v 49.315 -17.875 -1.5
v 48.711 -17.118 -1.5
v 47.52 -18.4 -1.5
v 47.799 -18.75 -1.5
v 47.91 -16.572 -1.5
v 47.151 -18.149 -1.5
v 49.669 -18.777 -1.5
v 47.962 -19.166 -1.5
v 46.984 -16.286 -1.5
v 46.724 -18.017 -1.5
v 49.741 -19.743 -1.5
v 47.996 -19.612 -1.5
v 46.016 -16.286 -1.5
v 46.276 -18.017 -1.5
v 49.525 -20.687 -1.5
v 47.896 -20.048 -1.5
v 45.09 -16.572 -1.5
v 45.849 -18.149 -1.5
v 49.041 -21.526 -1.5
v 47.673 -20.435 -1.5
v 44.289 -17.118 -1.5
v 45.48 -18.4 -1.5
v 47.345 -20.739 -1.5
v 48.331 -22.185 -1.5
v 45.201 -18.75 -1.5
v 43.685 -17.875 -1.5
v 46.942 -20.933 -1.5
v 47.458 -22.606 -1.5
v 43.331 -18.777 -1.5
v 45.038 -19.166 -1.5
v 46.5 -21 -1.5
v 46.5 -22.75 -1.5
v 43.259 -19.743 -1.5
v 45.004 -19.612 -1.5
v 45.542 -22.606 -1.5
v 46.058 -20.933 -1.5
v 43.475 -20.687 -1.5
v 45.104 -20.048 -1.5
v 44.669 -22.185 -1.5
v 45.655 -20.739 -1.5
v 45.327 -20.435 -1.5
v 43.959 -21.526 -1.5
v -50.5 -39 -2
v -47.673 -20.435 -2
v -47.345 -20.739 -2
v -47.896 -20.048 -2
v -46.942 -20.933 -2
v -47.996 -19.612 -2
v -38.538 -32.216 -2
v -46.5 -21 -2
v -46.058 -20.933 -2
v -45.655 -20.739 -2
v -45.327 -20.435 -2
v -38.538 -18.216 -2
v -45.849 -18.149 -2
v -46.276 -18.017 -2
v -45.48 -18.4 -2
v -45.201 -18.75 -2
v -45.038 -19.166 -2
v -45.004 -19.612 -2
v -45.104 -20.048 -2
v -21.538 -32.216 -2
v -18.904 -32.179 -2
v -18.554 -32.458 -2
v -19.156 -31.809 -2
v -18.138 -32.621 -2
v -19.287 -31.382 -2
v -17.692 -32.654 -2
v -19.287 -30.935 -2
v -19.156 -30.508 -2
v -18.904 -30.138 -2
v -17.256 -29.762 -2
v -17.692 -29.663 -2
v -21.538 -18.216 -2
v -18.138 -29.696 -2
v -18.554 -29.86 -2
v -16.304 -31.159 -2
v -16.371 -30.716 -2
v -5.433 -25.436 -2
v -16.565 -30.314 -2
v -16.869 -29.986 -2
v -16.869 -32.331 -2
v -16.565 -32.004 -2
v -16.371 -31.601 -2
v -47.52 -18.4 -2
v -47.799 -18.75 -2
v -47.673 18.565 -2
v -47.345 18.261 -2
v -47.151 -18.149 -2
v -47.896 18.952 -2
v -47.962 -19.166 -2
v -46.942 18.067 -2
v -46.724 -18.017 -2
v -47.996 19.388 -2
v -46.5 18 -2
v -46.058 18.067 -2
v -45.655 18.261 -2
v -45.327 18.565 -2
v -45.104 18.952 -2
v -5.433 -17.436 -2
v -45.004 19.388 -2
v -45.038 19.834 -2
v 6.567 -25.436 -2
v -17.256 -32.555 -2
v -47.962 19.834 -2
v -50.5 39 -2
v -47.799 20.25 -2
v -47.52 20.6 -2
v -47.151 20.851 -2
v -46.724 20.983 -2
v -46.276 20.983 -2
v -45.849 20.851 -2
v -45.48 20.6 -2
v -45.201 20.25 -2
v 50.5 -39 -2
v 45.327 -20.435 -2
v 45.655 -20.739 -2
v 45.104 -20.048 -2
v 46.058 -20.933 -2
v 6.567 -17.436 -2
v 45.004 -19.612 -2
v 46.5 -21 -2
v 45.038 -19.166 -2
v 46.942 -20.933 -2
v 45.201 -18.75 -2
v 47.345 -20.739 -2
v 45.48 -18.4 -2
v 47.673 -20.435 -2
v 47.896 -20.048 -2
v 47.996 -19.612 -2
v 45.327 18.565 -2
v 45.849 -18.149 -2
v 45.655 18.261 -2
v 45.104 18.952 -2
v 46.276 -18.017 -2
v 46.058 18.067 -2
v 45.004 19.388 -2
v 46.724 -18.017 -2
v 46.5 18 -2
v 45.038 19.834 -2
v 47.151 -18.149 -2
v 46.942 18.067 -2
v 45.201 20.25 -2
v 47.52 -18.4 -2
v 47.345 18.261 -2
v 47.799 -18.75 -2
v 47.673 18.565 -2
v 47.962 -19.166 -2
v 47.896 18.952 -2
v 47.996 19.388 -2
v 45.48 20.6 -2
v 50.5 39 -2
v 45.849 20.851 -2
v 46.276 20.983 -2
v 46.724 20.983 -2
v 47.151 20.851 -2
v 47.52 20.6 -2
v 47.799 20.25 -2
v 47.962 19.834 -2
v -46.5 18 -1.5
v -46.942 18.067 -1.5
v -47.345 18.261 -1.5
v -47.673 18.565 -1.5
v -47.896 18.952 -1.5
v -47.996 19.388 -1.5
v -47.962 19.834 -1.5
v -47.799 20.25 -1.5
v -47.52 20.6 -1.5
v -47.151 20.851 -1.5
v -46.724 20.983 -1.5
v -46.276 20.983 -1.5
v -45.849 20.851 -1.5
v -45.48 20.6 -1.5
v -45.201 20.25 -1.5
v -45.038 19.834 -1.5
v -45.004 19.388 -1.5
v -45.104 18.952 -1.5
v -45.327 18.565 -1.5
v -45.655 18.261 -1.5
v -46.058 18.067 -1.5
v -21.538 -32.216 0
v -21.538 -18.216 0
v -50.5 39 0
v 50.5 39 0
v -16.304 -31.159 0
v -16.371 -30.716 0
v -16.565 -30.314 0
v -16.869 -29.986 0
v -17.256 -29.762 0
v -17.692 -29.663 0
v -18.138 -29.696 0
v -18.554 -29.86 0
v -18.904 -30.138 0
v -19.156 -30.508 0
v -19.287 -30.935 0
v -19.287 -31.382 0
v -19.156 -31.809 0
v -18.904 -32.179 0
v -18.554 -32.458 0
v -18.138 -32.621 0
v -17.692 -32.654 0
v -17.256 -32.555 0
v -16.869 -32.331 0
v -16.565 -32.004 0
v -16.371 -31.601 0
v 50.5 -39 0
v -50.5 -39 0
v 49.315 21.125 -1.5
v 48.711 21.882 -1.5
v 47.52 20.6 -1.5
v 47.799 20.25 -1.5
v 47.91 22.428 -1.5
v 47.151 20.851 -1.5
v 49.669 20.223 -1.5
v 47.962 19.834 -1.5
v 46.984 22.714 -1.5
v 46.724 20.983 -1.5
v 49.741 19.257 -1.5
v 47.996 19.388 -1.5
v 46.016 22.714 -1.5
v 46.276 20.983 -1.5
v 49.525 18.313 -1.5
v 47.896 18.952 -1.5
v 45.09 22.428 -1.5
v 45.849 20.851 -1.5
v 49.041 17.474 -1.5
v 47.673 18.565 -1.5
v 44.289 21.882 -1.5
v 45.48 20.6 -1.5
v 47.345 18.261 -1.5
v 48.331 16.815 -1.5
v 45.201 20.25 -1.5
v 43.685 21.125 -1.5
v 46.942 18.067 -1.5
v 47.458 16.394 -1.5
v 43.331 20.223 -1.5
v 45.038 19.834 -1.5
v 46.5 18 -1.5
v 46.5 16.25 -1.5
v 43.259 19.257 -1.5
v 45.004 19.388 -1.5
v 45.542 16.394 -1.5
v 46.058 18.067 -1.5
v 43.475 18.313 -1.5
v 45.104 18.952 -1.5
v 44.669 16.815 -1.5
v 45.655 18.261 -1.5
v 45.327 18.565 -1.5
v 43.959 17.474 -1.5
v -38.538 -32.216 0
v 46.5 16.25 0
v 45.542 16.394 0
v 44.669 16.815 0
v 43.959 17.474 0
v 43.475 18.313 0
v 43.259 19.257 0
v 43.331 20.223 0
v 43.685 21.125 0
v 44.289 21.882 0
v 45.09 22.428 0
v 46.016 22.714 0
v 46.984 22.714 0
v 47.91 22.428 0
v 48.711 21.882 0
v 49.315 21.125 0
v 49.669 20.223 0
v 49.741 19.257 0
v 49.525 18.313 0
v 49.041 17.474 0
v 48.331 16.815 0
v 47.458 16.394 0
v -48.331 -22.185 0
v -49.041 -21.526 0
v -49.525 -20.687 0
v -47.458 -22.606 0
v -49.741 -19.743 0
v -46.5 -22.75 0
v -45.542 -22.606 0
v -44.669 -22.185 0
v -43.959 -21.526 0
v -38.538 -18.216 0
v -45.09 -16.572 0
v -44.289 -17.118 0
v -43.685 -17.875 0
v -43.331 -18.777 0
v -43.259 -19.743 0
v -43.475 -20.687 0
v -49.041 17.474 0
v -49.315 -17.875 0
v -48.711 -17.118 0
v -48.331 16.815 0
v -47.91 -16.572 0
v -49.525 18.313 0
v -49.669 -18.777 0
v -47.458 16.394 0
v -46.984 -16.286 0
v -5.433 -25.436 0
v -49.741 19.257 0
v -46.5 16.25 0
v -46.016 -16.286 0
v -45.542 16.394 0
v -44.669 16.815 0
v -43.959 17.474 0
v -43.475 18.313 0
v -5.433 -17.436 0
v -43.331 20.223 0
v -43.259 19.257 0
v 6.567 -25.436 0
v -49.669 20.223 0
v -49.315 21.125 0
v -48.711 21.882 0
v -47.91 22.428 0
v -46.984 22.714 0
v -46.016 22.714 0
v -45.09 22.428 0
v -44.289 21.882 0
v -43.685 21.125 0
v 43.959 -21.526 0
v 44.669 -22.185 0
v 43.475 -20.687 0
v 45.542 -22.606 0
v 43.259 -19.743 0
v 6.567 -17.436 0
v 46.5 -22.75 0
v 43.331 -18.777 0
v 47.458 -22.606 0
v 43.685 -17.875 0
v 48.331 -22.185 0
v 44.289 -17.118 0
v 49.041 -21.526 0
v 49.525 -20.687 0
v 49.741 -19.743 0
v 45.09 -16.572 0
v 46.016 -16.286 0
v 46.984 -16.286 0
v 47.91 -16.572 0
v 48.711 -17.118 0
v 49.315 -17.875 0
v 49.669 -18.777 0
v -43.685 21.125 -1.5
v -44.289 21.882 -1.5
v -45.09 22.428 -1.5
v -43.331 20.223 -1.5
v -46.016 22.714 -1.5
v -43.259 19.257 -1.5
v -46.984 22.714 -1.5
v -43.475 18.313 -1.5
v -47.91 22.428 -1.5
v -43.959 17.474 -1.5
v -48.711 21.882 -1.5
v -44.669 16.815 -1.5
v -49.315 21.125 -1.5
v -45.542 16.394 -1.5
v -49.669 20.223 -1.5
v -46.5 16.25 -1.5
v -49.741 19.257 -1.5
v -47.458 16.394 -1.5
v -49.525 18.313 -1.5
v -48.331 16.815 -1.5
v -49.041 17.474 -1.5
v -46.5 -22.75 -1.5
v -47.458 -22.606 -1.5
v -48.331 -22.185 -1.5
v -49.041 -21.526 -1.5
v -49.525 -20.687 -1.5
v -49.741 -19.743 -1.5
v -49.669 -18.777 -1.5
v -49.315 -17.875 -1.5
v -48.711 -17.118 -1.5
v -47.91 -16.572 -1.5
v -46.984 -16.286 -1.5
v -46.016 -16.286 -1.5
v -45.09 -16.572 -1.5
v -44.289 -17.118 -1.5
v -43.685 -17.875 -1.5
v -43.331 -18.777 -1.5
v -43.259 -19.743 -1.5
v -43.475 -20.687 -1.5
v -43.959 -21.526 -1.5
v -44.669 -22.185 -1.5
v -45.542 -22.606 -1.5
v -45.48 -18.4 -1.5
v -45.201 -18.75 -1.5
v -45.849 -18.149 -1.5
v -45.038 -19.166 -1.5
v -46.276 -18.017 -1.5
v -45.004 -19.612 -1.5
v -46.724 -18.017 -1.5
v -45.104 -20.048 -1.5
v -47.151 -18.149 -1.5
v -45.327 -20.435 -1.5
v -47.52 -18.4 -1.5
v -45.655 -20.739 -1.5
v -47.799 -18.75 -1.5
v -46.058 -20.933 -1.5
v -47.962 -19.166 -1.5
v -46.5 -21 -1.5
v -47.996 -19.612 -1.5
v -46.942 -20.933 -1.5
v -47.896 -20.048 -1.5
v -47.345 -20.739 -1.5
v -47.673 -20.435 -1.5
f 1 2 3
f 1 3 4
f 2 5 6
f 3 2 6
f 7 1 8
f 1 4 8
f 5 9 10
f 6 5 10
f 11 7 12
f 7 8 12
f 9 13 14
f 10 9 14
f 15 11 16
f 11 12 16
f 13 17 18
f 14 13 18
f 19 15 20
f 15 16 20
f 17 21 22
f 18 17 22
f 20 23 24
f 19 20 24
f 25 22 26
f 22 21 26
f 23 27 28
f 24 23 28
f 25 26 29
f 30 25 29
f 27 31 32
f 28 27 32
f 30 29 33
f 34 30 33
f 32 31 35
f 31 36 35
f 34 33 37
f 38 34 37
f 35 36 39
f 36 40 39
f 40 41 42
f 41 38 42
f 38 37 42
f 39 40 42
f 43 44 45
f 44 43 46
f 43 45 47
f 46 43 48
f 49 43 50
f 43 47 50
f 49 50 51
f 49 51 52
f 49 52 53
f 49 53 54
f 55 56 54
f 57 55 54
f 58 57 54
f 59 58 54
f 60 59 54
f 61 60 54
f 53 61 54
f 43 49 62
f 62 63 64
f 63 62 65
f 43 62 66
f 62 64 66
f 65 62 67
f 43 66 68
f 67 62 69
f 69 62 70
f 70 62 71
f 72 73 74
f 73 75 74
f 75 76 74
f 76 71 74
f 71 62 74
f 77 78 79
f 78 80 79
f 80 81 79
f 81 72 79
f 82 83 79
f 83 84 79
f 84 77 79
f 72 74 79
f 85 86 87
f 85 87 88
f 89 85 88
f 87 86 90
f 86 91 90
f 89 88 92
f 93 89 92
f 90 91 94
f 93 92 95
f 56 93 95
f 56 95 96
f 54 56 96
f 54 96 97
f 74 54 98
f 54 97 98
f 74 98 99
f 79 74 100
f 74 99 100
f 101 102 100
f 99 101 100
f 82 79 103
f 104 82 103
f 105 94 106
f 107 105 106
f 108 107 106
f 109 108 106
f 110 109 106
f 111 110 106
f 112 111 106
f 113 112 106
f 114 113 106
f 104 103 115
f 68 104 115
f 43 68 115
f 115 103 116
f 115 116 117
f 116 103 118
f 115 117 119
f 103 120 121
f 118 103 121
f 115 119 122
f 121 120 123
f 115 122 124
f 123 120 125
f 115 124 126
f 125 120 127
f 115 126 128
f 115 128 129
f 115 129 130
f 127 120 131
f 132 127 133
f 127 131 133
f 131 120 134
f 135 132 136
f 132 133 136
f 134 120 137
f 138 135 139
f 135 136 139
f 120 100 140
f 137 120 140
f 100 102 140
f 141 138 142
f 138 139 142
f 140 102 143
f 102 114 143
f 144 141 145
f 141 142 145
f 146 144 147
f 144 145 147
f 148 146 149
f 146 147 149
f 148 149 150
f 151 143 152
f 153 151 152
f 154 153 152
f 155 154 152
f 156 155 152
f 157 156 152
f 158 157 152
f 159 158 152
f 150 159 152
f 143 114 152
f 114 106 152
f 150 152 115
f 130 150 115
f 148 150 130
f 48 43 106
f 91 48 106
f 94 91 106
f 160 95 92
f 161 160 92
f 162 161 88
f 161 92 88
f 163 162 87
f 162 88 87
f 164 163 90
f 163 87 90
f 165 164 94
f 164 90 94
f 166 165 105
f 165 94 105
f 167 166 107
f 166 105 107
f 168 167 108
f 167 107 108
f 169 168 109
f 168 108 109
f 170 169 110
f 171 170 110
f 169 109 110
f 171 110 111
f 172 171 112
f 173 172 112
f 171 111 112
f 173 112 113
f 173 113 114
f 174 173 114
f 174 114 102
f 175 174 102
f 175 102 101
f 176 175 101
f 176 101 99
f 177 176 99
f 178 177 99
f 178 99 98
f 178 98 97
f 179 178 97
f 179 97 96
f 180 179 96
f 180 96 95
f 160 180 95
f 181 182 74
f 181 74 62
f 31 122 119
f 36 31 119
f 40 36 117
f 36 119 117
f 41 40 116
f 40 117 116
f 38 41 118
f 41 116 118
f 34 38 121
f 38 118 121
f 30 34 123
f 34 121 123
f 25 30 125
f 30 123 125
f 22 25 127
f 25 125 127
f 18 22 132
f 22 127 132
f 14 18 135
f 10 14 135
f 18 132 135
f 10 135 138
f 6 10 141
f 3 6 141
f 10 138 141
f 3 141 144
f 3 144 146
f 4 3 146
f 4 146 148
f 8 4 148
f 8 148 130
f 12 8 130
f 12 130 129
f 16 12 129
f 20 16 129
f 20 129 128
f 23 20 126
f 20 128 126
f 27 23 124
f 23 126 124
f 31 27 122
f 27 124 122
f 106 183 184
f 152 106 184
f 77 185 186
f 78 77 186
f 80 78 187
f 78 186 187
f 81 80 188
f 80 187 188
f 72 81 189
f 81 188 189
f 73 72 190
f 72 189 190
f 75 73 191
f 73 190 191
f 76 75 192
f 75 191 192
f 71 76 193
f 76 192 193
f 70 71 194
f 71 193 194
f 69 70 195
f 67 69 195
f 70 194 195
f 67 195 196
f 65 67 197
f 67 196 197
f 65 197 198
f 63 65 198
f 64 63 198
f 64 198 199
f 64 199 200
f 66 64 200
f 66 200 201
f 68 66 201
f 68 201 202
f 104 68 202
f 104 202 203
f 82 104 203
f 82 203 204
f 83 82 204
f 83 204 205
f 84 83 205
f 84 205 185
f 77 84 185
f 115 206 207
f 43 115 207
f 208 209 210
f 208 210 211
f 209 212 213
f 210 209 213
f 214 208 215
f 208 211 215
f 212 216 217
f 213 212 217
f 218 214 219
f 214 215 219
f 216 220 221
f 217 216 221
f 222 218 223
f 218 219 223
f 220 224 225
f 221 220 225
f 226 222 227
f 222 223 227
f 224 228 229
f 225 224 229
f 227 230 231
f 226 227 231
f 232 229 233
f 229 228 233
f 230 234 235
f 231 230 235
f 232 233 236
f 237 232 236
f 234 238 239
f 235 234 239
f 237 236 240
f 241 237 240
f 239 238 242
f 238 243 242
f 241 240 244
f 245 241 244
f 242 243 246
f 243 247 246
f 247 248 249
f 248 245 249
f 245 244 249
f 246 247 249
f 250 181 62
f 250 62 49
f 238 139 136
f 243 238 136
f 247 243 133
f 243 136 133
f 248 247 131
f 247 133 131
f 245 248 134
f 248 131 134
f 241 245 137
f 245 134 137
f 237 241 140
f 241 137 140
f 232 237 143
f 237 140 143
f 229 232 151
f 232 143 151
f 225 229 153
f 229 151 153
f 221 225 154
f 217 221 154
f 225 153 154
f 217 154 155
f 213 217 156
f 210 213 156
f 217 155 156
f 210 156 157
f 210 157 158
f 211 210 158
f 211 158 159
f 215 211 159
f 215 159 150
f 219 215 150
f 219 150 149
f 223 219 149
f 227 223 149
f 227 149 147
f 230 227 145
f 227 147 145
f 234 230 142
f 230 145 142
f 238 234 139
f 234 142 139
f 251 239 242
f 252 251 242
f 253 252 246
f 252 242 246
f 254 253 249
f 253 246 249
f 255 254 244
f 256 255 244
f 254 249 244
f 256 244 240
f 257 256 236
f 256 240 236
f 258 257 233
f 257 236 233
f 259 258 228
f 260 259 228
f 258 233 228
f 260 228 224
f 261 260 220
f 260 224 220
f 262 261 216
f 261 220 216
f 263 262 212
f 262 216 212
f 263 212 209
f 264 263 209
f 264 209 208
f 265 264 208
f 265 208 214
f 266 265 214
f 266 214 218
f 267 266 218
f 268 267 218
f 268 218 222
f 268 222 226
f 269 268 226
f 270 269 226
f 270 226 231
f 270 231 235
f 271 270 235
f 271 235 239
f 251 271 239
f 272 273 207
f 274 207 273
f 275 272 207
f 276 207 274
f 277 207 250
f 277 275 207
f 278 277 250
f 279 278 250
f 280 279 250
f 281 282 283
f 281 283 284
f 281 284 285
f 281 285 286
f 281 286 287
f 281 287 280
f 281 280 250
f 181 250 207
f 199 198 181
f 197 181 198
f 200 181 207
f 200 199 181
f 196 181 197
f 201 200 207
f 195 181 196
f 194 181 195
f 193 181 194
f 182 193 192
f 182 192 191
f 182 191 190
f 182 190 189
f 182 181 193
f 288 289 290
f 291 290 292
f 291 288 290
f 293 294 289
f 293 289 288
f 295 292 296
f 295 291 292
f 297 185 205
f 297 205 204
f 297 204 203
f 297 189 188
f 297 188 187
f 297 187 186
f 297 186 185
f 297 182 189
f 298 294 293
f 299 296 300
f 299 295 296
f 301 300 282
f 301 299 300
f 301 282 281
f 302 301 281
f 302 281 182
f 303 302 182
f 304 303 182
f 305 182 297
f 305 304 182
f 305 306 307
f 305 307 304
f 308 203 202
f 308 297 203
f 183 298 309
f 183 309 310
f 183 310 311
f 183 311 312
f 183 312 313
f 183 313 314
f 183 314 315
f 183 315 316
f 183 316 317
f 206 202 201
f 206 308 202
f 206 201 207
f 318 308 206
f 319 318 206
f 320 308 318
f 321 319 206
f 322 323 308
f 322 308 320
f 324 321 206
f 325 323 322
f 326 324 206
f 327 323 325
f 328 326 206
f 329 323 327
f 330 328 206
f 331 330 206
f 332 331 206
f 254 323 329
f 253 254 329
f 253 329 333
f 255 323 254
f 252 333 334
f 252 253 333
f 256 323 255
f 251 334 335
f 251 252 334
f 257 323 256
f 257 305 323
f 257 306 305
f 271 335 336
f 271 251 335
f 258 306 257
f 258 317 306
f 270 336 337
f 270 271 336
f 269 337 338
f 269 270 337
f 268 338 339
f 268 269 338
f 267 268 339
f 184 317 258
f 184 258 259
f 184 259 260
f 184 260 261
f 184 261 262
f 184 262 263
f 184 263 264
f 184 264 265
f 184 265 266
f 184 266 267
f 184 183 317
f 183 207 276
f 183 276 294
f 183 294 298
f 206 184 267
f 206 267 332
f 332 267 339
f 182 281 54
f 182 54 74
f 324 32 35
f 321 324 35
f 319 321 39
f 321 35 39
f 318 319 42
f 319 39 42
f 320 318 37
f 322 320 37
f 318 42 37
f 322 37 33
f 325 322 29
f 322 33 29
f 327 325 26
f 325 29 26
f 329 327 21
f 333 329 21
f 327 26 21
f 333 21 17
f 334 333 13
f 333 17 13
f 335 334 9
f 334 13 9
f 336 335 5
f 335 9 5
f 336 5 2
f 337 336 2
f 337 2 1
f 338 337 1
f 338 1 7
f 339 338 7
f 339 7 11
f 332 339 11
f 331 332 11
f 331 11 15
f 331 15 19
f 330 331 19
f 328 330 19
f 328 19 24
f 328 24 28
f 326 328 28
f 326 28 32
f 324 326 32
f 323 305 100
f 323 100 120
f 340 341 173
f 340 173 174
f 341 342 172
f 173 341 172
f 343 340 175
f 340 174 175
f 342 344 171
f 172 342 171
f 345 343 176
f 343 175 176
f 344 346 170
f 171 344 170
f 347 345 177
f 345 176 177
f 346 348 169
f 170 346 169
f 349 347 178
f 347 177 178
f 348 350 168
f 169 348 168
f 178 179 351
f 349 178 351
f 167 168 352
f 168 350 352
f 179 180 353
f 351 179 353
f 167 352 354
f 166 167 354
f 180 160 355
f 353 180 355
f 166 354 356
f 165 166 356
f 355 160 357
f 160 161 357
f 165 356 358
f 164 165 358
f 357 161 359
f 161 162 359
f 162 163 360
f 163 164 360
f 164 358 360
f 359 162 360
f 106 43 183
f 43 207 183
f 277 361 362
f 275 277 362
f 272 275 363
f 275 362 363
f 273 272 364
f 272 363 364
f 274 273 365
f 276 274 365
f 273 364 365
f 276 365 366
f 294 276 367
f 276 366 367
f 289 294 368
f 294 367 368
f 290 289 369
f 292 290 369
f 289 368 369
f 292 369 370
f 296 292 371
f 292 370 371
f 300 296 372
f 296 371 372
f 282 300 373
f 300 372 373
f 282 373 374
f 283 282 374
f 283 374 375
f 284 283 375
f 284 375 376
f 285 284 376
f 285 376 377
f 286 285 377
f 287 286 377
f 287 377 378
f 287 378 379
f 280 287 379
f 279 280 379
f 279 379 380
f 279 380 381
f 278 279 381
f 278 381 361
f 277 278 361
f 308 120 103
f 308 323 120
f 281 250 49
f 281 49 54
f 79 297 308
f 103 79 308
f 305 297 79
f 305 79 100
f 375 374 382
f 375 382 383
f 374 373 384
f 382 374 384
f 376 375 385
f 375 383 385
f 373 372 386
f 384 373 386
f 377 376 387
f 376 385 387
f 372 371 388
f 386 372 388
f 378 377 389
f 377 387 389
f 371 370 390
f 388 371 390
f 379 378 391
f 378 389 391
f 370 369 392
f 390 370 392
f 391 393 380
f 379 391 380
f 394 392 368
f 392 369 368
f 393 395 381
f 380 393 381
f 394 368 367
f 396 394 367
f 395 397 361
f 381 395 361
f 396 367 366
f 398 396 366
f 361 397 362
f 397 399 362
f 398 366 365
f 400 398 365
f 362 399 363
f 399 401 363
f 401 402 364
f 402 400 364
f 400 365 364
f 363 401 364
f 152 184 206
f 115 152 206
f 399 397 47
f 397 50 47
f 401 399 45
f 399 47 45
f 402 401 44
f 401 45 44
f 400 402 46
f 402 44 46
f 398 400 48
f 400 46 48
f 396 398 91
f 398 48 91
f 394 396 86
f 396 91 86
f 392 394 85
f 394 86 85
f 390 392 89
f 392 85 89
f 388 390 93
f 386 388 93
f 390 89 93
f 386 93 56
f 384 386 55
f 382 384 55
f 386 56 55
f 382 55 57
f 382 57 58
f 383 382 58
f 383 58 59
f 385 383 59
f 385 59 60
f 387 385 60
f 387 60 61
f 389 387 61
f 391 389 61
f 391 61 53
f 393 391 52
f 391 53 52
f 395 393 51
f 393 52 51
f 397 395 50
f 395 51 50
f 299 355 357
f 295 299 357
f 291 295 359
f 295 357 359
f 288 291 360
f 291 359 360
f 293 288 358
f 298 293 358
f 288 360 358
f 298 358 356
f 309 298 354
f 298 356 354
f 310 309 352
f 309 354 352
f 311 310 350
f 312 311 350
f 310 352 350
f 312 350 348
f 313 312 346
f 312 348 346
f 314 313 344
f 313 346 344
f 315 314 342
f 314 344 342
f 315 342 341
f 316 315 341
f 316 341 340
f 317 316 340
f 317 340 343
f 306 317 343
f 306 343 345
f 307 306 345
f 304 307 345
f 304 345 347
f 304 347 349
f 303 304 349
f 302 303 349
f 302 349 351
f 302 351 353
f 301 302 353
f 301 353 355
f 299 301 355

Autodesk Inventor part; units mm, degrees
ref_plane "YZ Plane" through (0, 0, 0) normal (1, 0, 0) x (0, 1, 0)
ref_plane "XZ Plane" through (0, 0, 0) normal (0, 1, 0) x (-1, 0, 0)
ref_plane "XY Plane" through (0, 0, 0) normal (0, 0, 1) x (1, 0, 0)
sketch "Esboço1" plane through (0, 0, 0) normal (0, 0, 1) x (1, 0, 0)
  line L0 (-50.5, 39) -> (50.5, 39)
  line L1 (50.5, 39) -> (50.5, -39)
  line L2 (50.5, -39) -> (-50.5, -39)
  line L3 (-50.5, -39) -> (-50.5, 39)
  point P0 (0, 0)
  dimension "d2" = 101
  dimension "d3" = 78
  dimension "d4" = 101
  dimension "d5" = 50.5
  dimension "d6" = 39
extrude "Extrusão1" add sketch "Esboço1" against normal blind 2
sketch "Esboço2" plane through (0, 0, 0) normal (0, 0, 1) x (1, 0, 0)
  line L0 (50.5, -39) -> (-50.5, -39) projected
  line L1 (42.5, 39) -> (42.5, -39) construction
  line L2 (-50.5, -39) -> (-50.5, 39) projected
  line L3 (50.5, 39) -> (50.5, -39) projected
  line L4 (-42.5, 39) -> (-42.5, -39) construction
  line L5 (-50.5, 39) -> (50.5, 39) projected
  line L6 (-50.5, 19.5) -> (50.5, 19.5) construction
  line L7 (-50.5, -19.5) -> (50.5, -19.5) construction
  line L8 (-50.5, 39) -> (50.5, 39) projected
  line L9 (-46.5, 39) -> (-46.5, -39) construction
  line L10 (50.5, -39) -> (-50.5, -39) projected
  line L11 (46.5, 39) -> (46.5, -39) construction
  point P0 (0, 0)
  point P1 (-46.5, 19.5)
  point P2 (-46.5, -19.5)
  point P3 (46.5, -19.5)
  point P4 (46.5, 19.5)
  dimension "d32" = 8
  dimension "d33" = 8
  dimension "d34" = 4
  dimension "d35" = 4
  dimension "d36" = 19.5
  dimension "d37" = 58.5
  dimension "d38" = 78
  dimension "d39" = 78
hole "Furo2" at (-46.5, 19.5, 0) at (-46.5, -19.5, 0) at (46.5, -19.5, 0) at (46.5, 19.5, 0) direction (0, 0, -1) diameter 3 end through all counterbore diameter 6.5 counterbore depth 1.5
sketch "Esboço3" plane through (0, 0, 0) normal (0, 0, 1) x (1, 0, 0)
  line L0 (-22.0376, -18.7161) -> (-38.0376, -18.7161) projected
  line L1 (-38.0376, -18.7161) -> (-38.0376, -31.7161) projected
  line L2 (-22.0376, -31.7161) -> (-22.0376, -18.7161) projected
  line L3 (-38.0376, -31.7161) -> (-22.0376, -31.7161) projected
  line L4 (-39.6791, -31.6586) -> (39.7959, -31.6586) projected
  line L5 (-18.3542, -30.6586) -> (-17.2542, -30.6586) projected
  line L6 (-18.8542, -30.6586) -> (-18.3542, -30.6586) projected
  line L7 (-17.2542, -30.6586) -> (-16.7542, -30.6586) projected
  line L8 (-16.5542, -30.6586) -> (-16.7542, -30.6586) projected
  line L9 (-16.5542, -30.6586) -> (-16.5542, -30.6586) projected
  line L10 (-16.5542, -31.6586) -> (-16.5542, -30.6586) projected
  line L11 (-16.6542, -31.6586) -> (-16.5542, -31.6586) projected
  line L12 (-16.6542, -31.6586) -> (-17.0042, -31.6586) projected
  line L13 (-17.1042, -31.6586) -> (-17.0042, -31.6586) projected
  line L14 (-17.1042, -31.6586) -> (-17.6542, -31.6586) projected
  line L15 (-17.9542, -31.6586) -> (-17.6542, -31.6586) projected
  line L16 (-17.9542, -31.6586) -> (-18.9542, -31.6586) projected
  line L17 (-19.0542, -31.6586) -> (-18.7042, -31.6586) projected
  line L18 (-19.0542, -30.6586) -> (-19.0542, -31.6586) projected
  line L19 (-9.5679, -25.4931) -> (-14.5971, -25.4931) projected
  line L20 (12.8419, -28.4101) -> (10.7613, -25.4356)
  line L21 (10.7613, -31.6586) -> (10.7613, -25.4356) projected
  line L22 (12.8419, -29.4261) -> (12.8419, -28.4101) projected
  line L23 (-14.5971, -31.7161) -> (-14.5971, -25.4931) projected
  line L24 (-9.5679, -31.7161) -> (-9.5679, -25.4931) projected
  line L25 (-21.5376, -32.2161) -> (-38.5376, -32.2161)
  line L26 (-38.5376, -32.2161) -> (-38.5376, -18.2161)
  line L27 (-38.5376, -18.2161) -> (-21.5376, -18.2161)
  line L28 (-21.5376, -18.2161) -> (-21.5376, -32.2161)
  circle A0 centre (-17.8042, -31.1586) radius 1.5
  line L29 (-9.5679, -25.4356) -> (10.7613, -25.4356) construction
  line L30 (-5.4326, -25.4356) -> (6.5674, -25.4356)
  line L31 (-5.4326, -25.4356) -> (-5.4326, -17.4356)
  line L32 (-5.4326, -17.4356) -> (6.5674, -17.4356)
  line L33 (6.5674, -17.4356) -> (6.5674, -25.4356)
  line L34 (10.7029, -25.4356) -> (15.7321, -25.4356) projected
  line L35 (15.7321, -31.6586) -> (15.7321, -25.4356) projected
  line L36 (10.7029, -31.6586) -> (10.7029, -25.4356) projected
  line L37 (-14.5971, -31.6586) -> (-9.5679, -31.6586) projected
  line L38 (-9.5679, -31.6586) -> (-9.5679, -25.4356) projected
  line L39 (-14.5971, -25.4356) -> (-9.5679, -25.4356) projected
  line L40 (-14.5971, -31.6586) -> (-14.5971, -25.4356) projected
  point P0 (0, 0)
  point P1 (39.7959, -31.6586)
  dimension "d49" = 17
  dimension "d50" = 14
  dimension "d51" = 17
  dimension "d52" = 3
  dimension "d61" = 8
  dimension "d70" = 0.5
  dimension "d71" = 0
  dimension "d72" = 0.5
  dimension "d74" = 12
  dimension "d75" = 16.105
  dimension "d76" = 4.1355
  dimension "d77" = 4.1353
extrude "Extrusão2" cut sketch "Esboço3" against normal blind 10 contours L2 L4 L1 L0 | L0 L1 L4 L26 L27 L28 L2 | L4 L28 L25 L26 L1 L3 L2 | L2 L3 L1 L4 | A0 L4 | L4 A0 | L31 L32 L33 L30
equation "\"d2\" = 2 * d5"
equation "\"d3\" = 2 * d6"
equation "\"d4\" = d2"
equation "\"d33\" = d32"
equation "\"d34\" = d35"
equation "\"d35\" = 0.5 * d32"
properties part number "Ra-Manager_Painel-Placas" material "Aço, carbono"
